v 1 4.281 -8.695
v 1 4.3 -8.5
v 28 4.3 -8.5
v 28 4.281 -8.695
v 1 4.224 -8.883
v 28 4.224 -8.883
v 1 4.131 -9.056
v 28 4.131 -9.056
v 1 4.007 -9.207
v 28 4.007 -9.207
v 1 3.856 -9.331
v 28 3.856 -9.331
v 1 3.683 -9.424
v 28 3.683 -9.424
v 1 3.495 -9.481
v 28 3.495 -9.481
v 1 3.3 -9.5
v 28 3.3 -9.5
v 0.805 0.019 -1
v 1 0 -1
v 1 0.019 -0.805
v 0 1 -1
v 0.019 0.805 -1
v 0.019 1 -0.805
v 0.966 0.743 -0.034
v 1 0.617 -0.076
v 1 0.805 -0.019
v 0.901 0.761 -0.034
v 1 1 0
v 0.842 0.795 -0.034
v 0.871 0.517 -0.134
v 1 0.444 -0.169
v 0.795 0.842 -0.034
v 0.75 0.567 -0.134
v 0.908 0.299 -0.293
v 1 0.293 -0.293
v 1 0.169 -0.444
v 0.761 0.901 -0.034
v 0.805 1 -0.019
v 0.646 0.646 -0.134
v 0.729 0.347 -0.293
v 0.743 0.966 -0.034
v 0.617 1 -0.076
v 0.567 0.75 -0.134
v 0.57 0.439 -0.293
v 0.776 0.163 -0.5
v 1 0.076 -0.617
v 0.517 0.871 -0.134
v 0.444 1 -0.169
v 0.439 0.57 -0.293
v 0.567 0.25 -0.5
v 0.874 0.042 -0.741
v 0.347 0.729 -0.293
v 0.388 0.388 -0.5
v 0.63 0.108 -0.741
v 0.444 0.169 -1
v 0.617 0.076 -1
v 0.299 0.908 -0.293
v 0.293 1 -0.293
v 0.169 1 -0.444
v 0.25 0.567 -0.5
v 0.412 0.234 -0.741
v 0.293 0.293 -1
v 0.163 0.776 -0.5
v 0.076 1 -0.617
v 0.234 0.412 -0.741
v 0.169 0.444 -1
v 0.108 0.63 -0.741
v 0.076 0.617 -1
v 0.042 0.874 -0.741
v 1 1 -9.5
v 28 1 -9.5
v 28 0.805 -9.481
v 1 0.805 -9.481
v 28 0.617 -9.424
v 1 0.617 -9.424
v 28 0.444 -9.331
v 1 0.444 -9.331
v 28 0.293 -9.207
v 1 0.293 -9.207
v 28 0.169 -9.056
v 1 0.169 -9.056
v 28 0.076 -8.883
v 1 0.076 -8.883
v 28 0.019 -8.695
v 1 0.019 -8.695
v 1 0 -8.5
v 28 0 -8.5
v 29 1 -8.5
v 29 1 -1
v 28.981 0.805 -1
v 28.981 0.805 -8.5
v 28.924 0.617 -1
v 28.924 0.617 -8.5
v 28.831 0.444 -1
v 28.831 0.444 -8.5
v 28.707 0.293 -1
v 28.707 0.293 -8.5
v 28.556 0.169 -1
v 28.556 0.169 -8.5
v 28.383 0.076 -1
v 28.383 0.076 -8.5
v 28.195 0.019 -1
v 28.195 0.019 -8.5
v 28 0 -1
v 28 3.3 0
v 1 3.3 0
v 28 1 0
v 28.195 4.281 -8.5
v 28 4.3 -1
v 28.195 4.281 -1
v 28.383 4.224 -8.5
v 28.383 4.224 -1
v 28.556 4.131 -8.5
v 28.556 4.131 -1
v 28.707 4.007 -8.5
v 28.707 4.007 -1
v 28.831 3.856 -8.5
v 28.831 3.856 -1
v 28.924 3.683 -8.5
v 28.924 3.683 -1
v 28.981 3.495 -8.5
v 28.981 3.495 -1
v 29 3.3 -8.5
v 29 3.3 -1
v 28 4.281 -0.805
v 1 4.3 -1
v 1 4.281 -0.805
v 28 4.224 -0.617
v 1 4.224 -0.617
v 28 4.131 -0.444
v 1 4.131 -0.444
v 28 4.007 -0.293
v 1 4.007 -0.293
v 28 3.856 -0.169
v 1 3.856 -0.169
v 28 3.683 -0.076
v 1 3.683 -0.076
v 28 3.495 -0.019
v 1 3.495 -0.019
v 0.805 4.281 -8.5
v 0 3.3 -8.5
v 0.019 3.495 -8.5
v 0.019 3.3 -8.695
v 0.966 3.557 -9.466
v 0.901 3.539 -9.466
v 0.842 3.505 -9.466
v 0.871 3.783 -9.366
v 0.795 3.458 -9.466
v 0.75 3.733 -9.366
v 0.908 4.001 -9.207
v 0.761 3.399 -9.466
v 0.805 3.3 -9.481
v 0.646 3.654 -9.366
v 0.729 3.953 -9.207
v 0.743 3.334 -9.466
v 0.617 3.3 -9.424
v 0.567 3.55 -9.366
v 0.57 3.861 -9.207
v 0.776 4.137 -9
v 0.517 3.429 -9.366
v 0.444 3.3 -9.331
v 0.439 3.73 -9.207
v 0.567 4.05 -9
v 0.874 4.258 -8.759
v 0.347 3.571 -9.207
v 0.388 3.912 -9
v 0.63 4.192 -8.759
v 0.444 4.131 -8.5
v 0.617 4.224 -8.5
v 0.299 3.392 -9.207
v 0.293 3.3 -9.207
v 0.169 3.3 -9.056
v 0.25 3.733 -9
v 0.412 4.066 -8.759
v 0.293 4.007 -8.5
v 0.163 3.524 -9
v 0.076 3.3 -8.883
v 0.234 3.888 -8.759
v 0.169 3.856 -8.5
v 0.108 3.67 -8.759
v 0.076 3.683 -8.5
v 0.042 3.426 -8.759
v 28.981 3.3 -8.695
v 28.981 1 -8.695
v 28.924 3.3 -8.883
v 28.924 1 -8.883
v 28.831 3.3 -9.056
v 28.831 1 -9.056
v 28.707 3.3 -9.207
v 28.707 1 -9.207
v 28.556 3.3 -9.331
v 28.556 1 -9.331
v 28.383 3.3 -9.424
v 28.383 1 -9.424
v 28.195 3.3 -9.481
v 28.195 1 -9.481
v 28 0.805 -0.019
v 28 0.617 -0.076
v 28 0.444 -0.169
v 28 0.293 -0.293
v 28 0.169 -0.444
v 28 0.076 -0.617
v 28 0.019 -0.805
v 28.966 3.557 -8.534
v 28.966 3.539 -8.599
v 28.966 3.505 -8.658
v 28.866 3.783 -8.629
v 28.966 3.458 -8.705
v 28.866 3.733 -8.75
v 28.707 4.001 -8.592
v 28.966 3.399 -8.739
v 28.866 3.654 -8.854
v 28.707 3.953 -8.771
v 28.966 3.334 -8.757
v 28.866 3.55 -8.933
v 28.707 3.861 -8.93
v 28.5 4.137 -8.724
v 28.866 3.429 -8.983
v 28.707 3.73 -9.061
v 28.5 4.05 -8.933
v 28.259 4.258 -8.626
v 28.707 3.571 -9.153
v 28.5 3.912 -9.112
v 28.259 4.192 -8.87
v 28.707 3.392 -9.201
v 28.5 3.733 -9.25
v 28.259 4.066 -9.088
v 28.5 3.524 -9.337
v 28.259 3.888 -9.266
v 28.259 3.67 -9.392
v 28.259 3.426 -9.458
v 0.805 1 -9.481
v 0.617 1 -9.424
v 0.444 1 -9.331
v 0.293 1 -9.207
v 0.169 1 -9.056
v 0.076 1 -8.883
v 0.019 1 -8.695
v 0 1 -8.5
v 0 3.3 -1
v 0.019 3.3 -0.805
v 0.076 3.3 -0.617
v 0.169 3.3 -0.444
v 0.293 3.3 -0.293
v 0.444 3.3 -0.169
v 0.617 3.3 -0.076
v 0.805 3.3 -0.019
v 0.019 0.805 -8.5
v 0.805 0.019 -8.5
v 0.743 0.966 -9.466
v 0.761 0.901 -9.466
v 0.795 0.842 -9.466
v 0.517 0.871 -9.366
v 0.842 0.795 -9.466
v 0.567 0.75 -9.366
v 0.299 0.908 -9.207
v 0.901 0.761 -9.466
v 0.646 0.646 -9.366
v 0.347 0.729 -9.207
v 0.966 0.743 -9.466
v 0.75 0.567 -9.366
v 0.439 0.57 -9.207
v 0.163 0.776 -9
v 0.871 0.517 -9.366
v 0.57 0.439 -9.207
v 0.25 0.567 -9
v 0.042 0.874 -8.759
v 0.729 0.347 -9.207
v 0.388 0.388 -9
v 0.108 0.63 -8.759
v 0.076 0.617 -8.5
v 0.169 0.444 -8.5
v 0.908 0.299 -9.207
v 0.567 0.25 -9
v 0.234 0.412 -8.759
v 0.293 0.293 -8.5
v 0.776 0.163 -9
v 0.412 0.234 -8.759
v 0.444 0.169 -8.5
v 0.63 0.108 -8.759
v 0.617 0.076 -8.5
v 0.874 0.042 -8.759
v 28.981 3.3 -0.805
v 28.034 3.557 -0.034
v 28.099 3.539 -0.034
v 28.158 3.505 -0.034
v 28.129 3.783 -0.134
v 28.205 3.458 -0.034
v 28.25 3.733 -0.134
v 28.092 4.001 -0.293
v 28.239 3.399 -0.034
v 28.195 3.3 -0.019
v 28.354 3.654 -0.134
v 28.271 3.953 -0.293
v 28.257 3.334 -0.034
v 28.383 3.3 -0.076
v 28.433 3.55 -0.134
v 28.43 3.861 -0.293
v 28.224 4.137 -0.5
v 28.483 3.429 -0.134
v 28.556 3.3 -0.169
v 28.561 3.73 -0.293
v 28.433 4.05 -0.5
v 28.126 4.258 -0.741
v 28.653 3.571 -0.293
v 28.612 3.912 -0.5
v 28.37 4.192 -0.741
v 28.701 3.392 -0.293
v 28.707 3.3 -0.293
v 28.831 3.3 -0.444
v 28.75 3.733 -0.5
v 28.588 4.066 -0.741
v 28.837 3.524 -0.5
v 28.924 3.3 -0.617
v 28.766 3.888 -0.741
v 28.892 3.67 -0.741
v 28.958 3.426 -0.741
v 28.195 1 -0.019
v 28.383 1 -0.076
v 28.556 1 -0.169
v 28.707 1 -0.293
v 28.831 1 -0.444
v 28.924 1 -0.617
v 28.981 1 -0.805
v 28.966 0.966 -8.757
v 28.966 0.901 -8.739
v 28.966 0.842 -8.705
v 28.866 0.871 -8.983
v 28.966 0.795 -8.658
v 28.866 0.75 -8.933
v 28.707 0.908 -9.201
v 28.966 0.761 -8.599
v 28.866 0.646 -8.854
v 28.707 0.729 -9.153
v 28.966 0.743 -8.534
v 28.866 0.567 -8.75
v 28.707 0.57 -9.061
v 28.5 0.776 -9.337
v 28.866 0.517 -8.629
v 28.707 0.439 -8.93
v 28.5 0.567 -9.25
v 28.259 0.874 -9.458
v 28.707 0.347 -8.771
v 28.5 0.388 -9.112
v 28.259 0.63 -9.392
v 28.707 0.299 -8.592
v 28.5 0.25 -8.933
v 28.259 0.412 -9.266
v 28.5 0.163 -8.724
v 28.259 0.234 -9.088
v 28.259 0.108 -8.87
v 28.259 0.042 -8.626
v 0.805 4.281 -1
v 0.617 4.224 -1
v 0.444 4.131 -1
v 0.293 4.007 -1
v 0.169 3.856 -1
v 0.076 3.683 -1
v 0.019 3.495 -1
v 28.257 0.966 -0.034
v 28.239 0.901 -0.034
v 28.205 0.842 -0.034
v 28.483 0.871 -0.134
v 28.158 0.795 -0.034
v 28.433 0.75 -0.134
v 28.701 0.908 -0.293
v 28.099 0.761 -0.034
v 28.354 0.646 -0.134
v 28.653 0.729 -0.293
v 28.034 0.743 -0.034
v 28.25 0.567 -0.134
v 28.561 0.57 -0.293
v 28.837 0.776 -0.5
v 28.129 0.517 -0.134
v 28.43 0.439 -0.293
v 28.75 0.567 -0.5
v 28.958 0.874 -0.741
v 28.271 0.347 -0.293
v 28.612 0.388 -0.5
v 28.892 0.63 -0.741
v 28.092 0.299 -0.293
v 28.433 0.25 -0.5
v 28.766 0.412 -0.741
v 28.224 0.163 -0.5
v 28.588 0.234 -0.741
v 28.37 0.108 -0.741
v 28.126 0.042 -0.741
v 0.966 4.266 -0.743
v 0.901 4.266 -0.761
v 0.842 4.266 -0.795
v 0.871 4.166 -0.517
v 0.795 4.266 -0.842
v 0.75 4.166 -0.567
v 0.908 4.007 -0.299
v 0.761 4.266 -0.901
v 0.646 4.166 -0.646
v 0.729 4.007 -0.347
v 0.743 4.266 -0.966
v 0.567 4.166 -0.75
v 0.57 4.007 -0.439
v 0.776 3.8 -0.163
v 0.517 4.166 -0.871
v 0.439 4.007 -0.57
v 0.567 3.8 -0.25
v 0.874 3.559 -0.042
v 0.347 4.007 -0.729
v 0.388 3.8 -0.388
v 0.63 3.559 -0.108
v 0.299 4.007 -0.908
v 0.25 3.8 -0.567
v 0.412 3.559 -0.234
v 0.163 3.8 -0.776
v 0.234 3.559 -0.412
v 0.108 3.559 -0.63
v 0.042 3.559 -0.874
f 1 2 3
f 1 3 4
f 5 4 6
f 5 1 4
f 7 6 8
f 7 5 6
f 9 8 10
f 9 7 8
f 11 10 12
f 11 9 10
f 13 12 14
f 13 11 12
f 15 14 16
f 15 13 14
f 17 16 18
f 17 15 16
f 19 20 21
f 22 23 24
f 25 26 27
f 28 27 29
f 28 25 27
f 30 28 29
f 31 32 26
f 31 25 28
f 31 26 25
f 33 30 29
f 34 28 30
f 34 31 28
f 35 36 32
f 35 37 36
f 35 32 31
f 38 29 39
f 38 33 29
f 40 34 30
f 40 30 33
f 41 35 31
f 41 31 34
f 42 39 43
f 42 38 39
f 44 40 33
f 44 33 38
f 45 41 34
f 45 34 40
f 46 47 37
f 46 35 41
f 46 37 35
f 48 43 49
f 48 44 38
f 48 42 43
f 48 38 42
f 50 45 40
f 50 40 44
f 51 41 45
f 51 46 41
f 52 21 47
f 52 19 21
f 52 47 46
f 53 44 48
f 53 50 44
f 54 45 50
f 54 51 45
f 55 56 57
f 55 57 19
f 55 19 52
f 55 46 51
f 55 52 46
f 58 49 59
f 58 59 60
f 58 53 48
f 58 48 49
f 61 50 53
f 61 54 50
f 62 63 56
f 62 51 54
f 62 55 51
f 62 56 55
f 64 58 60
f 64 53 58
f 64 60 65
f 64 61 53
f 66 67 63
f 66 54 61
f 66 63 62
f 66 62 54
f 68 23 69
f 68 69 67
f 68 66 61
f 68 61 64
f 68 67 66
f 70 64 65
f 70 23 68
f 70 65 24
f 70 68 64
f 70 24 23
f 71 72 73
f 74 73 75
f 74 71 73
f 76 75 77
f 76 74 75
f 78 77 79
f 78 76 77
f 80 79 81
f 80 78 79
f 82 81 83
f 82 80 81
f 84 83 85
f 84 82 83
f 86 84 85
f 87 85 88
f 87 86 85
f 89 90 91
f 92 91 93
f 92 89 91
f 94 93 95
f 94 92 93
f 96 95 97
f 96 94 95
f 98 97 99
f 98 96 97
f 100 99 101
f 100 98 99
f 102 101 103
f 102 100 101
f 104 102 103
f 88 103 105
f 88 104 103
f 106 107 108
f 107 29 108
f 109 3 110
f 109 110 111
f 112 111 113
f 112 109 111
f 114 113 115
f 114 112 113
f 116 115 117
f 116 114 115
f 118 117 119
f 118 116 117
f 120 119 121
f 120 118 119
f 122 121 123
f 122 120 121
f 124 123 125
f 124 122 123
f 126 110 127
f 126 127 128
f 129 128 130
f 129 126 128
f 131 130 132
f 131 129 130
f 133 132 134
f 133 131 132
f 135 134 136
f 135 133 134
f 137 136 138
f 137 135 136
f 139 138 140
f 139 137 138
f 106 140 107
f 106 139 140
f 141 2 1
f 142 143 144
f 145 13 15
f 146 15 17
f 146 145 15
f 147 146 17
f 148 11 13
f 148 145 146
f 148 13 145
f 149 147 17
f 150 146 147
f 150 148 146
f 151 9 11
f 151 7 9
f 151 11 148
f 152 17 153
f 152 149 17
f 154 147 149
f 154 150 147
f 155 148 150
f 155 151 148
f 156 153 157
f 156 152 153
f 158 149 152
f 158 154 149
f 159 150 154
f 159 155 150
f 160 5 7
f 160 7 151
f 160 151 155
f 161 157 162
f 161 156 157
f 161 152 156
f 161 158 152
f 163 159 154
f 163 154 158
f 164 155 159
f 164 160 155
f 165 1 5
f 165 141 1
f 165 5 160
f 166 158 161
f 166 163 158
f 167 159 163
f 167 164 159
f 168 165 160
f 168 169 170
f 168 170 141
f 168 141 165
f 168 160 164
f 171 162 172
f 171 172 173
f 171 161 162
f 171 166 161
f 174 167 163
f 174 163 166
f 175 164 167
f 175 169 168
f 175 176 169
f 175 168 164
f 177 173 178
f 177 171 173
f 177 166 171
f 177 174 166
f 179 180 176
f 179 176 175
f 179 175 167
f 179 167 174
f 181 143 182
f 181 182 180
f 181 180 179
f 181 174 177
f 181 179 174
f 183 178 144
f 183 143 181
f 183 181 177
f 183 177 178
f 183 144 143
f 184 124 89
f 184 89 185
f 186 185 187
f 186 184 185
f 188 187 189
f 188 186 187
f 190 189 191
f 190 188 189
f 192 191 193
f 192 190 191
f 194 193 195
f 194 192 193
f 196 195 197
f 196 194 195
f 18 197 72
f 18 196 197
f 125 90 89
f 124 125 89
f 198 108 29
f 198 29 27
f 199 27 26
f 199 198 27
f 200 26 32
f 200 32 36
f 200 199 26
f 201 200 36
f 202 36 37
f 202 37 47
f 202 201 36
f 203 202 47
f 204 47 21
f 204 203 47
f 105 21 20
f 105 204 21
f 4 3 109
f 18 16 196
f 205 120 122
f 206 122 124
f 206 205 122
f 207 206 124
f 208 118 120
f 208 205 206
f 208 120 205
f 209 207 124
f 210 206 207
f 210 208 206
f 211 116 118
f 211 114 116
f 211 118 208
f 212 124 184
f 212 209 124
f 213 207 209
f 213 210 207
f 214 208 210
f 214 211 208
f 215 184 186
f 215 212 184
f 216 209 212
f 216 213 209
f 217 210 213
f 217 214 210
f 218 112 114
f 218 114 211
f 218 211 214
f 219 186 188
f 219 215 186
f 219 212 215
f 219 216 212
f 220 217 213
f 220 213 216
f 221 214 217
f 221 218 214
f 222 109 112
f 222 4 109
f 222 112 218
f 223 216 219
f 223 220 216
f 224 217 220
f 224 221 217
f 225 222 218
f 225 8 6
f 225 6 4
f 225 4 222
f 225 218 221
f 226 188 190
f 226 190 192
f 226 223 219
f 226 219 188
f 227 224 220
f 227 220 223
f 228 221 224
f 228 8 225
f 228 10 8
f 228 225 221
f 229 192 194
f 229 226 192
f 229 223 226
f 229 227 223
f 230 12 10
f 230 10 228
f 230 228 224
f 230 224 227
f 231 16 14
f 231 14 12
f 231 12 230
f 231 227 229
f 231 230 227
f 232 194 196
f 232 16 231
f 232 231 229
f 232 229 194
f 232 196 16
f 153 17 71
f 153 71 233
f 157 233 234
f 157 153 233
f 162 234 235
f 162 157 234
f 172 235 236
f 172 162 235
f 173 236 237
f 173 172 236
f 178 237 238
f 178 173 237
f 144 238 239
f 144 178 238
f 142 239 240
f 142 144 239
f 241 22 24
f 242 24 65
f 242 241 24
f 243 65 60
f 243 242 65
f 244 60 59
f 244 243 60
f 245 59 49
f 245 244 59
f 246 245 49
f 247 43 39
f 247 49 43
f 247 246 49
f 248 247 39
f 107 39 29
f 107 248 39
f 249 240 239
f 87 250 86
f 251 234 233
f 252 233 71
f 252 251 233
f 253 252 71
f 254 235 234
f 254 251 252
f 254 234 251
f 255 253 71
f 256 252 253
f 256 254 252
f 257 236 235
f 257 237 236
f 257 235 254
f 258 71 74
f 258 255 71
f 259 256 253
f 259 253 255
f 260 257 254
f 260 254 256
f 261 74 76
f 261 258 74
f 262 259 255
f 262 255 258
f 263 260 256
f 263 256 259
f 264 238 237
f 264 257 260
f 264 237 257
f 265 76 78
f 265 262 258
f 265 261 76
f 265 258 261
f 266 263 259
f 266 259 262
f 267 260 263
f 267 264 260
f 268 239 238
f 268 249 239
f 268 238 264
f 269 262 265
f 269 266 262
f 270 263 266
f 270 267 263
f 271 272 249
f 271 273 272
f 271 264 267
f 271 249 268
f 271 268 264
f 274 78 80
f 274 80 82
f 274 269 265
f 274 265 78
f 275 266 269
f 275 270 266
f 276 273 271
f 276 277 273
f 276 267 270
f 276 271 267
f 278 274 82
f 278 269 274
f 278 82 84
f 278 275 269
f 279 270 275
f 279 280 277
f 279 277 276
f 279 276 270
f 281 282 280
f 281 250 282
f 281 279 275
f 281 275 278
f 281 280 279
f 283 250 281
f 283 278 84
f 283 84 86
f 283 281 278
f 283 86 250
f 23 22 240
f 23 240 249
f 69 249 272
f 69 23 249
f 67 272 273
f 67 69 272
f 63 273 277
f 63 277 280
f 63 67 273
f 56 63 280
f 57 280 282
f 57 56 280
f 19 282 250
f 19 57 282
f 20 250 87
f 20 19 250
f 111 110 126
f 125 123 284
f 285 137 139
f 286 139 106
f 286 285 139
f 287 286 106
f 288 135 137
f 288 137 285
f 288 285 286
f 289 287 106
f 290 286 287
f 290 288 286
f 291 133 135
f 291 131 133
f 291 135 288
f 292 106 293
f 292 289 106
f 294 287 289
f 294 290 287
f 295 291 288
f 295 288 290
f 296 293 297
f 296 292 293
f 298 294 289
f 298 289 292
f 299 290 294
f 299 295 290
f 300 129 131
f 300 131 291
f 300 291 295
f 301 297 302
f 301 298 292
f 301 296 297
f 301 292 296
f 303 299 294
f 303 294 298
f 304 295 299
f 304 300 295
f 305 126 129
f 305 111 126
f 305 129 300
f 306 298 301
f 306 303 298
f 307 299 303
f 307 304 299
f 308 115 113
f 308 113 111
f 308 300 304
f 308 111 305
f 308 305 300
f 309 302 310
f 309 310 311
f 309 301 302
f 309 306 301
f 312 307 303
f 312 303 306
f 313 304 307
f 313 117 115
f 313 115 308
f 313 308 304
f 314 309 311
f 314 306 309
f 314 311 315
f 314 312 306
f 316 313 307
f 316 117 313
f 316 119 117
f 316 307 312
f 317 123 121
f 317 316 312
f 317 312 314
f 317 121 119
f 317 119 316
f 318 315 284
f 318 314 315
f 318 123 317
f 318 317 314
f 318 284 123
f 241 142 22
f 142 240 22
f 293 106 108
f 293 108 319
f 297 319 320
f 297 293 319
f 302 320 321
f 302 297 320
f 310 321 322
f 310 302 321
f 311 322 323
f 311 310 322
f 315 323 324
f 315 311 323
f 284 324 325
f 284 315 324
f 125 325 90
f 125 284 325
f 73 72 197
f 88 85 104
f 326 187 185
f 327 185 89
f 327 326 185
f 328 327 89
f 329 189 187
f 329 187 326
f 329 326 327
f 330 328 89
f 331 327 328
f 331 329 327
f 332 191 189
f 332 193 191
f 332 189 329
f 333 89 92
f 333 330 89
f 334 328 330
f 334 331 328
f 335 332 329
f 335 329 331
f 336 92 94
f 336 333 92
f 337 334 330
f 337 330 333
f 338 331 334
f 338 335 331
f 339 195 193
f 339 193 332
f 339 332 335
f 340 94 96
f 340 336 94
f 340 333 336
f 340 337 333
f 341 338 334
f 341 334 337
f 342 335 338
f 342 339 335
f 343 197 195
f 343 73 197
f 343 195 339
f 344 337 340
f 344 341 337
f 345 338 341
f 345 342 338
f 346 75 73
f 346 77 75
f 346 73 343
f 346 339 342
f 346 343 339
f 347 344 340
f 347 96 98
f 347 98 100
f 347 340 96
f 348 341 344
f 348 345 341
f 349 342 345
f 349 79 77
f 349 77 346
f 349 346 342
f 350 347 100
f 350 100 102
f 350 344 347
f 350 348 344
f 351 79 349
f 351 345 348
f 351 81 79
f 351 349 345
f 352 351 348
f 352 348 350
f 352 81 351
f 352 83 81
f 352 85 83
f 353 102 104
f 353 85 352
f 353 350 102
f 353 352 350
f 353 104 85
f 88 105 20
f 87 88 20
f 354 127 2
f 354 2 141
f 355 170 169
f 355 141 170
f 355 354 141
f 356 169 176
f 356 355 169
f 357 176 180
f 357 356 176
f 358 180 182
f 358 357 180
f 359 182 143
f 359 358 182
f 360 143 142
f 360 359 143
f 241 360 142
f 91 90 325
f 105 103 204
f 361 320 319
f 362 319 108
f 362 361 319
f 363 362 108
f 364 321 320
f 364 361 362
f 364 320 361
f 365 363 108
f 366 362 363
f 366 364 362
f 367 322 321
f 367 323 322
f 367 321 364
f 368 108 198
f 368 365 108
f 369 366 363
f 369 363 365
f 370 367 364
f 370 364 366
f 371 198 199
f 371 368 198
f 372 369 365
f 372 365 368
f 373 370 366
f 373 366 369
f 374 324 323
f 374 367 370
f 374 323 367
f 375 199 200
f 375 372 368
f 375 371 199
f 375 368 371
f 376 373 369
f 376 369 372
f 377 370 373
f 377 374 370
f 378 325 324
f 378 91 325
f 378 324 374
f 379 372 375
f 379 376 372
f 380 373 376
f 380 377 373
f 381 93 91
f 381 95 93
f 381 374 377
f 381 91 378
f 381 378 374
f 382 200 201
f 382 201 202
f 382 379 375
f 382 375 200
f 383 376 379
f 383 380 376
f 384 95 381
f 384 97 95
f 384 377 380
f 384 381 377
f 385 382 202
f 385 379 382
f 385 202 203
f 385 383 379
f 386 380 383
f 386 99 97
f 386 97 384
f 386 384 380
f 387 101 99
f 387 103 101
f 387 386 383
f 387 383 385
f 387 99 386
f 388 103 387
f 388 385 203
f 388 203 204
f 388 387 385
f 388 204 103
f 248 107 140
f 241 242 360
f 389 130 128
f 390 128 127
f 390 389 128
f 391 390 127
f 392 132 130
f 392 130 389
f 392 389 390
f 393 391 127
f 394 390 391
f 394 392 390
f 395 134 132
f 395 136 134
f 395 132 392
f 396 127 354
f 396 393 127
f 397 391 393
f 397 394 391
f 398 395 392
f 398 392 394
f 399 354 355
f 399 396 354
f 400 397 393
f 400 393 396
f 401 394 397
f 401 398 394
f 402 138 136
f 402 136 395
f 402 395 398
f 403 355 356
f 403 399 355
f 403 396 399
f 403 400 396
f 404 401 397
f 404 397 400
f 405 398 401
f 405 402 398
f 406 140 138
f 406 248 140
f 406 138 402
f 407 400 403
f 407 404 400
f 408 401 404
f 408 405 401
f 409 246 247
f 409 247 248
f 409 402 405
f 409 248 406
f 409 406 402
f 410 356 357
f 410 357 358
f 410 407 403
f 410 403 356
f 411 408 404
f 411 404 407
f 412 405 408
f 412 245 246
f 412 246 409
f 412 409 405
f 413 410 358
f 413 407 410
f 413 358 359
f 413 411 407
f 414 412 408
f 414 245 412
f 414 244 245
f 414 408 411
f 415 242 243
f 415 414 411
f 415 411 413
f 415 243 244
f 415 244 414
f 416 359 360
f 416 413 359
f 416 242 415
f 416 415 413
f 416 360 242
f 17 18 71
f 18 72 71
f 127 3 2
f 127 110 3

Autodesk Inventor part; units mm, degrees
ref_plane "YZ Plane" through (0, 0, 0) normal (1, 0, 0) x (0, 1, 0)
ref_plane "XZ Plane" through (0, 0, 0) normal (0, 1, 0) x (-1, 0, 0)
ref_plane "XY Plane" through (0, 0, 0) normal (0, 0, 1) x (1, 0, 0)
sketch "Sketch1" plane through (0, 0, 0) normal (0, 1, 0) x (-1, 0, 0)
  line L0 (0, 0) -> (-29, 0)
  line L1 (-29, 0) -> (-29, -9.5)
  line L2 (-29, -9.5) -> (0, -9.5)
  line L3 (0, -9.5) -> (0, 0)
  dimension "d0" = 29
  dimension "d1" = 9.5
extrude "Extrusion1" add sketch "Sketch1" along normal blind 4.3
fillet "Fillet1" radius 1 12 edges at (0, 0, -4.75) (0, 2.15, 0) (0, 4.3, -4.75) (0, 2.15, -9.5) (14.5, 0, -9.5) (14.5, 4.3, -9.5) (29, 2.15, -9.5) (29, 0, -4.75) (29, 4.3, -4.75) (29, 2.15, 0) (14.5, 0, 0) (14.5, 4.3, 0)
properties part number "Magnet3010" material "Stainless Steel"
